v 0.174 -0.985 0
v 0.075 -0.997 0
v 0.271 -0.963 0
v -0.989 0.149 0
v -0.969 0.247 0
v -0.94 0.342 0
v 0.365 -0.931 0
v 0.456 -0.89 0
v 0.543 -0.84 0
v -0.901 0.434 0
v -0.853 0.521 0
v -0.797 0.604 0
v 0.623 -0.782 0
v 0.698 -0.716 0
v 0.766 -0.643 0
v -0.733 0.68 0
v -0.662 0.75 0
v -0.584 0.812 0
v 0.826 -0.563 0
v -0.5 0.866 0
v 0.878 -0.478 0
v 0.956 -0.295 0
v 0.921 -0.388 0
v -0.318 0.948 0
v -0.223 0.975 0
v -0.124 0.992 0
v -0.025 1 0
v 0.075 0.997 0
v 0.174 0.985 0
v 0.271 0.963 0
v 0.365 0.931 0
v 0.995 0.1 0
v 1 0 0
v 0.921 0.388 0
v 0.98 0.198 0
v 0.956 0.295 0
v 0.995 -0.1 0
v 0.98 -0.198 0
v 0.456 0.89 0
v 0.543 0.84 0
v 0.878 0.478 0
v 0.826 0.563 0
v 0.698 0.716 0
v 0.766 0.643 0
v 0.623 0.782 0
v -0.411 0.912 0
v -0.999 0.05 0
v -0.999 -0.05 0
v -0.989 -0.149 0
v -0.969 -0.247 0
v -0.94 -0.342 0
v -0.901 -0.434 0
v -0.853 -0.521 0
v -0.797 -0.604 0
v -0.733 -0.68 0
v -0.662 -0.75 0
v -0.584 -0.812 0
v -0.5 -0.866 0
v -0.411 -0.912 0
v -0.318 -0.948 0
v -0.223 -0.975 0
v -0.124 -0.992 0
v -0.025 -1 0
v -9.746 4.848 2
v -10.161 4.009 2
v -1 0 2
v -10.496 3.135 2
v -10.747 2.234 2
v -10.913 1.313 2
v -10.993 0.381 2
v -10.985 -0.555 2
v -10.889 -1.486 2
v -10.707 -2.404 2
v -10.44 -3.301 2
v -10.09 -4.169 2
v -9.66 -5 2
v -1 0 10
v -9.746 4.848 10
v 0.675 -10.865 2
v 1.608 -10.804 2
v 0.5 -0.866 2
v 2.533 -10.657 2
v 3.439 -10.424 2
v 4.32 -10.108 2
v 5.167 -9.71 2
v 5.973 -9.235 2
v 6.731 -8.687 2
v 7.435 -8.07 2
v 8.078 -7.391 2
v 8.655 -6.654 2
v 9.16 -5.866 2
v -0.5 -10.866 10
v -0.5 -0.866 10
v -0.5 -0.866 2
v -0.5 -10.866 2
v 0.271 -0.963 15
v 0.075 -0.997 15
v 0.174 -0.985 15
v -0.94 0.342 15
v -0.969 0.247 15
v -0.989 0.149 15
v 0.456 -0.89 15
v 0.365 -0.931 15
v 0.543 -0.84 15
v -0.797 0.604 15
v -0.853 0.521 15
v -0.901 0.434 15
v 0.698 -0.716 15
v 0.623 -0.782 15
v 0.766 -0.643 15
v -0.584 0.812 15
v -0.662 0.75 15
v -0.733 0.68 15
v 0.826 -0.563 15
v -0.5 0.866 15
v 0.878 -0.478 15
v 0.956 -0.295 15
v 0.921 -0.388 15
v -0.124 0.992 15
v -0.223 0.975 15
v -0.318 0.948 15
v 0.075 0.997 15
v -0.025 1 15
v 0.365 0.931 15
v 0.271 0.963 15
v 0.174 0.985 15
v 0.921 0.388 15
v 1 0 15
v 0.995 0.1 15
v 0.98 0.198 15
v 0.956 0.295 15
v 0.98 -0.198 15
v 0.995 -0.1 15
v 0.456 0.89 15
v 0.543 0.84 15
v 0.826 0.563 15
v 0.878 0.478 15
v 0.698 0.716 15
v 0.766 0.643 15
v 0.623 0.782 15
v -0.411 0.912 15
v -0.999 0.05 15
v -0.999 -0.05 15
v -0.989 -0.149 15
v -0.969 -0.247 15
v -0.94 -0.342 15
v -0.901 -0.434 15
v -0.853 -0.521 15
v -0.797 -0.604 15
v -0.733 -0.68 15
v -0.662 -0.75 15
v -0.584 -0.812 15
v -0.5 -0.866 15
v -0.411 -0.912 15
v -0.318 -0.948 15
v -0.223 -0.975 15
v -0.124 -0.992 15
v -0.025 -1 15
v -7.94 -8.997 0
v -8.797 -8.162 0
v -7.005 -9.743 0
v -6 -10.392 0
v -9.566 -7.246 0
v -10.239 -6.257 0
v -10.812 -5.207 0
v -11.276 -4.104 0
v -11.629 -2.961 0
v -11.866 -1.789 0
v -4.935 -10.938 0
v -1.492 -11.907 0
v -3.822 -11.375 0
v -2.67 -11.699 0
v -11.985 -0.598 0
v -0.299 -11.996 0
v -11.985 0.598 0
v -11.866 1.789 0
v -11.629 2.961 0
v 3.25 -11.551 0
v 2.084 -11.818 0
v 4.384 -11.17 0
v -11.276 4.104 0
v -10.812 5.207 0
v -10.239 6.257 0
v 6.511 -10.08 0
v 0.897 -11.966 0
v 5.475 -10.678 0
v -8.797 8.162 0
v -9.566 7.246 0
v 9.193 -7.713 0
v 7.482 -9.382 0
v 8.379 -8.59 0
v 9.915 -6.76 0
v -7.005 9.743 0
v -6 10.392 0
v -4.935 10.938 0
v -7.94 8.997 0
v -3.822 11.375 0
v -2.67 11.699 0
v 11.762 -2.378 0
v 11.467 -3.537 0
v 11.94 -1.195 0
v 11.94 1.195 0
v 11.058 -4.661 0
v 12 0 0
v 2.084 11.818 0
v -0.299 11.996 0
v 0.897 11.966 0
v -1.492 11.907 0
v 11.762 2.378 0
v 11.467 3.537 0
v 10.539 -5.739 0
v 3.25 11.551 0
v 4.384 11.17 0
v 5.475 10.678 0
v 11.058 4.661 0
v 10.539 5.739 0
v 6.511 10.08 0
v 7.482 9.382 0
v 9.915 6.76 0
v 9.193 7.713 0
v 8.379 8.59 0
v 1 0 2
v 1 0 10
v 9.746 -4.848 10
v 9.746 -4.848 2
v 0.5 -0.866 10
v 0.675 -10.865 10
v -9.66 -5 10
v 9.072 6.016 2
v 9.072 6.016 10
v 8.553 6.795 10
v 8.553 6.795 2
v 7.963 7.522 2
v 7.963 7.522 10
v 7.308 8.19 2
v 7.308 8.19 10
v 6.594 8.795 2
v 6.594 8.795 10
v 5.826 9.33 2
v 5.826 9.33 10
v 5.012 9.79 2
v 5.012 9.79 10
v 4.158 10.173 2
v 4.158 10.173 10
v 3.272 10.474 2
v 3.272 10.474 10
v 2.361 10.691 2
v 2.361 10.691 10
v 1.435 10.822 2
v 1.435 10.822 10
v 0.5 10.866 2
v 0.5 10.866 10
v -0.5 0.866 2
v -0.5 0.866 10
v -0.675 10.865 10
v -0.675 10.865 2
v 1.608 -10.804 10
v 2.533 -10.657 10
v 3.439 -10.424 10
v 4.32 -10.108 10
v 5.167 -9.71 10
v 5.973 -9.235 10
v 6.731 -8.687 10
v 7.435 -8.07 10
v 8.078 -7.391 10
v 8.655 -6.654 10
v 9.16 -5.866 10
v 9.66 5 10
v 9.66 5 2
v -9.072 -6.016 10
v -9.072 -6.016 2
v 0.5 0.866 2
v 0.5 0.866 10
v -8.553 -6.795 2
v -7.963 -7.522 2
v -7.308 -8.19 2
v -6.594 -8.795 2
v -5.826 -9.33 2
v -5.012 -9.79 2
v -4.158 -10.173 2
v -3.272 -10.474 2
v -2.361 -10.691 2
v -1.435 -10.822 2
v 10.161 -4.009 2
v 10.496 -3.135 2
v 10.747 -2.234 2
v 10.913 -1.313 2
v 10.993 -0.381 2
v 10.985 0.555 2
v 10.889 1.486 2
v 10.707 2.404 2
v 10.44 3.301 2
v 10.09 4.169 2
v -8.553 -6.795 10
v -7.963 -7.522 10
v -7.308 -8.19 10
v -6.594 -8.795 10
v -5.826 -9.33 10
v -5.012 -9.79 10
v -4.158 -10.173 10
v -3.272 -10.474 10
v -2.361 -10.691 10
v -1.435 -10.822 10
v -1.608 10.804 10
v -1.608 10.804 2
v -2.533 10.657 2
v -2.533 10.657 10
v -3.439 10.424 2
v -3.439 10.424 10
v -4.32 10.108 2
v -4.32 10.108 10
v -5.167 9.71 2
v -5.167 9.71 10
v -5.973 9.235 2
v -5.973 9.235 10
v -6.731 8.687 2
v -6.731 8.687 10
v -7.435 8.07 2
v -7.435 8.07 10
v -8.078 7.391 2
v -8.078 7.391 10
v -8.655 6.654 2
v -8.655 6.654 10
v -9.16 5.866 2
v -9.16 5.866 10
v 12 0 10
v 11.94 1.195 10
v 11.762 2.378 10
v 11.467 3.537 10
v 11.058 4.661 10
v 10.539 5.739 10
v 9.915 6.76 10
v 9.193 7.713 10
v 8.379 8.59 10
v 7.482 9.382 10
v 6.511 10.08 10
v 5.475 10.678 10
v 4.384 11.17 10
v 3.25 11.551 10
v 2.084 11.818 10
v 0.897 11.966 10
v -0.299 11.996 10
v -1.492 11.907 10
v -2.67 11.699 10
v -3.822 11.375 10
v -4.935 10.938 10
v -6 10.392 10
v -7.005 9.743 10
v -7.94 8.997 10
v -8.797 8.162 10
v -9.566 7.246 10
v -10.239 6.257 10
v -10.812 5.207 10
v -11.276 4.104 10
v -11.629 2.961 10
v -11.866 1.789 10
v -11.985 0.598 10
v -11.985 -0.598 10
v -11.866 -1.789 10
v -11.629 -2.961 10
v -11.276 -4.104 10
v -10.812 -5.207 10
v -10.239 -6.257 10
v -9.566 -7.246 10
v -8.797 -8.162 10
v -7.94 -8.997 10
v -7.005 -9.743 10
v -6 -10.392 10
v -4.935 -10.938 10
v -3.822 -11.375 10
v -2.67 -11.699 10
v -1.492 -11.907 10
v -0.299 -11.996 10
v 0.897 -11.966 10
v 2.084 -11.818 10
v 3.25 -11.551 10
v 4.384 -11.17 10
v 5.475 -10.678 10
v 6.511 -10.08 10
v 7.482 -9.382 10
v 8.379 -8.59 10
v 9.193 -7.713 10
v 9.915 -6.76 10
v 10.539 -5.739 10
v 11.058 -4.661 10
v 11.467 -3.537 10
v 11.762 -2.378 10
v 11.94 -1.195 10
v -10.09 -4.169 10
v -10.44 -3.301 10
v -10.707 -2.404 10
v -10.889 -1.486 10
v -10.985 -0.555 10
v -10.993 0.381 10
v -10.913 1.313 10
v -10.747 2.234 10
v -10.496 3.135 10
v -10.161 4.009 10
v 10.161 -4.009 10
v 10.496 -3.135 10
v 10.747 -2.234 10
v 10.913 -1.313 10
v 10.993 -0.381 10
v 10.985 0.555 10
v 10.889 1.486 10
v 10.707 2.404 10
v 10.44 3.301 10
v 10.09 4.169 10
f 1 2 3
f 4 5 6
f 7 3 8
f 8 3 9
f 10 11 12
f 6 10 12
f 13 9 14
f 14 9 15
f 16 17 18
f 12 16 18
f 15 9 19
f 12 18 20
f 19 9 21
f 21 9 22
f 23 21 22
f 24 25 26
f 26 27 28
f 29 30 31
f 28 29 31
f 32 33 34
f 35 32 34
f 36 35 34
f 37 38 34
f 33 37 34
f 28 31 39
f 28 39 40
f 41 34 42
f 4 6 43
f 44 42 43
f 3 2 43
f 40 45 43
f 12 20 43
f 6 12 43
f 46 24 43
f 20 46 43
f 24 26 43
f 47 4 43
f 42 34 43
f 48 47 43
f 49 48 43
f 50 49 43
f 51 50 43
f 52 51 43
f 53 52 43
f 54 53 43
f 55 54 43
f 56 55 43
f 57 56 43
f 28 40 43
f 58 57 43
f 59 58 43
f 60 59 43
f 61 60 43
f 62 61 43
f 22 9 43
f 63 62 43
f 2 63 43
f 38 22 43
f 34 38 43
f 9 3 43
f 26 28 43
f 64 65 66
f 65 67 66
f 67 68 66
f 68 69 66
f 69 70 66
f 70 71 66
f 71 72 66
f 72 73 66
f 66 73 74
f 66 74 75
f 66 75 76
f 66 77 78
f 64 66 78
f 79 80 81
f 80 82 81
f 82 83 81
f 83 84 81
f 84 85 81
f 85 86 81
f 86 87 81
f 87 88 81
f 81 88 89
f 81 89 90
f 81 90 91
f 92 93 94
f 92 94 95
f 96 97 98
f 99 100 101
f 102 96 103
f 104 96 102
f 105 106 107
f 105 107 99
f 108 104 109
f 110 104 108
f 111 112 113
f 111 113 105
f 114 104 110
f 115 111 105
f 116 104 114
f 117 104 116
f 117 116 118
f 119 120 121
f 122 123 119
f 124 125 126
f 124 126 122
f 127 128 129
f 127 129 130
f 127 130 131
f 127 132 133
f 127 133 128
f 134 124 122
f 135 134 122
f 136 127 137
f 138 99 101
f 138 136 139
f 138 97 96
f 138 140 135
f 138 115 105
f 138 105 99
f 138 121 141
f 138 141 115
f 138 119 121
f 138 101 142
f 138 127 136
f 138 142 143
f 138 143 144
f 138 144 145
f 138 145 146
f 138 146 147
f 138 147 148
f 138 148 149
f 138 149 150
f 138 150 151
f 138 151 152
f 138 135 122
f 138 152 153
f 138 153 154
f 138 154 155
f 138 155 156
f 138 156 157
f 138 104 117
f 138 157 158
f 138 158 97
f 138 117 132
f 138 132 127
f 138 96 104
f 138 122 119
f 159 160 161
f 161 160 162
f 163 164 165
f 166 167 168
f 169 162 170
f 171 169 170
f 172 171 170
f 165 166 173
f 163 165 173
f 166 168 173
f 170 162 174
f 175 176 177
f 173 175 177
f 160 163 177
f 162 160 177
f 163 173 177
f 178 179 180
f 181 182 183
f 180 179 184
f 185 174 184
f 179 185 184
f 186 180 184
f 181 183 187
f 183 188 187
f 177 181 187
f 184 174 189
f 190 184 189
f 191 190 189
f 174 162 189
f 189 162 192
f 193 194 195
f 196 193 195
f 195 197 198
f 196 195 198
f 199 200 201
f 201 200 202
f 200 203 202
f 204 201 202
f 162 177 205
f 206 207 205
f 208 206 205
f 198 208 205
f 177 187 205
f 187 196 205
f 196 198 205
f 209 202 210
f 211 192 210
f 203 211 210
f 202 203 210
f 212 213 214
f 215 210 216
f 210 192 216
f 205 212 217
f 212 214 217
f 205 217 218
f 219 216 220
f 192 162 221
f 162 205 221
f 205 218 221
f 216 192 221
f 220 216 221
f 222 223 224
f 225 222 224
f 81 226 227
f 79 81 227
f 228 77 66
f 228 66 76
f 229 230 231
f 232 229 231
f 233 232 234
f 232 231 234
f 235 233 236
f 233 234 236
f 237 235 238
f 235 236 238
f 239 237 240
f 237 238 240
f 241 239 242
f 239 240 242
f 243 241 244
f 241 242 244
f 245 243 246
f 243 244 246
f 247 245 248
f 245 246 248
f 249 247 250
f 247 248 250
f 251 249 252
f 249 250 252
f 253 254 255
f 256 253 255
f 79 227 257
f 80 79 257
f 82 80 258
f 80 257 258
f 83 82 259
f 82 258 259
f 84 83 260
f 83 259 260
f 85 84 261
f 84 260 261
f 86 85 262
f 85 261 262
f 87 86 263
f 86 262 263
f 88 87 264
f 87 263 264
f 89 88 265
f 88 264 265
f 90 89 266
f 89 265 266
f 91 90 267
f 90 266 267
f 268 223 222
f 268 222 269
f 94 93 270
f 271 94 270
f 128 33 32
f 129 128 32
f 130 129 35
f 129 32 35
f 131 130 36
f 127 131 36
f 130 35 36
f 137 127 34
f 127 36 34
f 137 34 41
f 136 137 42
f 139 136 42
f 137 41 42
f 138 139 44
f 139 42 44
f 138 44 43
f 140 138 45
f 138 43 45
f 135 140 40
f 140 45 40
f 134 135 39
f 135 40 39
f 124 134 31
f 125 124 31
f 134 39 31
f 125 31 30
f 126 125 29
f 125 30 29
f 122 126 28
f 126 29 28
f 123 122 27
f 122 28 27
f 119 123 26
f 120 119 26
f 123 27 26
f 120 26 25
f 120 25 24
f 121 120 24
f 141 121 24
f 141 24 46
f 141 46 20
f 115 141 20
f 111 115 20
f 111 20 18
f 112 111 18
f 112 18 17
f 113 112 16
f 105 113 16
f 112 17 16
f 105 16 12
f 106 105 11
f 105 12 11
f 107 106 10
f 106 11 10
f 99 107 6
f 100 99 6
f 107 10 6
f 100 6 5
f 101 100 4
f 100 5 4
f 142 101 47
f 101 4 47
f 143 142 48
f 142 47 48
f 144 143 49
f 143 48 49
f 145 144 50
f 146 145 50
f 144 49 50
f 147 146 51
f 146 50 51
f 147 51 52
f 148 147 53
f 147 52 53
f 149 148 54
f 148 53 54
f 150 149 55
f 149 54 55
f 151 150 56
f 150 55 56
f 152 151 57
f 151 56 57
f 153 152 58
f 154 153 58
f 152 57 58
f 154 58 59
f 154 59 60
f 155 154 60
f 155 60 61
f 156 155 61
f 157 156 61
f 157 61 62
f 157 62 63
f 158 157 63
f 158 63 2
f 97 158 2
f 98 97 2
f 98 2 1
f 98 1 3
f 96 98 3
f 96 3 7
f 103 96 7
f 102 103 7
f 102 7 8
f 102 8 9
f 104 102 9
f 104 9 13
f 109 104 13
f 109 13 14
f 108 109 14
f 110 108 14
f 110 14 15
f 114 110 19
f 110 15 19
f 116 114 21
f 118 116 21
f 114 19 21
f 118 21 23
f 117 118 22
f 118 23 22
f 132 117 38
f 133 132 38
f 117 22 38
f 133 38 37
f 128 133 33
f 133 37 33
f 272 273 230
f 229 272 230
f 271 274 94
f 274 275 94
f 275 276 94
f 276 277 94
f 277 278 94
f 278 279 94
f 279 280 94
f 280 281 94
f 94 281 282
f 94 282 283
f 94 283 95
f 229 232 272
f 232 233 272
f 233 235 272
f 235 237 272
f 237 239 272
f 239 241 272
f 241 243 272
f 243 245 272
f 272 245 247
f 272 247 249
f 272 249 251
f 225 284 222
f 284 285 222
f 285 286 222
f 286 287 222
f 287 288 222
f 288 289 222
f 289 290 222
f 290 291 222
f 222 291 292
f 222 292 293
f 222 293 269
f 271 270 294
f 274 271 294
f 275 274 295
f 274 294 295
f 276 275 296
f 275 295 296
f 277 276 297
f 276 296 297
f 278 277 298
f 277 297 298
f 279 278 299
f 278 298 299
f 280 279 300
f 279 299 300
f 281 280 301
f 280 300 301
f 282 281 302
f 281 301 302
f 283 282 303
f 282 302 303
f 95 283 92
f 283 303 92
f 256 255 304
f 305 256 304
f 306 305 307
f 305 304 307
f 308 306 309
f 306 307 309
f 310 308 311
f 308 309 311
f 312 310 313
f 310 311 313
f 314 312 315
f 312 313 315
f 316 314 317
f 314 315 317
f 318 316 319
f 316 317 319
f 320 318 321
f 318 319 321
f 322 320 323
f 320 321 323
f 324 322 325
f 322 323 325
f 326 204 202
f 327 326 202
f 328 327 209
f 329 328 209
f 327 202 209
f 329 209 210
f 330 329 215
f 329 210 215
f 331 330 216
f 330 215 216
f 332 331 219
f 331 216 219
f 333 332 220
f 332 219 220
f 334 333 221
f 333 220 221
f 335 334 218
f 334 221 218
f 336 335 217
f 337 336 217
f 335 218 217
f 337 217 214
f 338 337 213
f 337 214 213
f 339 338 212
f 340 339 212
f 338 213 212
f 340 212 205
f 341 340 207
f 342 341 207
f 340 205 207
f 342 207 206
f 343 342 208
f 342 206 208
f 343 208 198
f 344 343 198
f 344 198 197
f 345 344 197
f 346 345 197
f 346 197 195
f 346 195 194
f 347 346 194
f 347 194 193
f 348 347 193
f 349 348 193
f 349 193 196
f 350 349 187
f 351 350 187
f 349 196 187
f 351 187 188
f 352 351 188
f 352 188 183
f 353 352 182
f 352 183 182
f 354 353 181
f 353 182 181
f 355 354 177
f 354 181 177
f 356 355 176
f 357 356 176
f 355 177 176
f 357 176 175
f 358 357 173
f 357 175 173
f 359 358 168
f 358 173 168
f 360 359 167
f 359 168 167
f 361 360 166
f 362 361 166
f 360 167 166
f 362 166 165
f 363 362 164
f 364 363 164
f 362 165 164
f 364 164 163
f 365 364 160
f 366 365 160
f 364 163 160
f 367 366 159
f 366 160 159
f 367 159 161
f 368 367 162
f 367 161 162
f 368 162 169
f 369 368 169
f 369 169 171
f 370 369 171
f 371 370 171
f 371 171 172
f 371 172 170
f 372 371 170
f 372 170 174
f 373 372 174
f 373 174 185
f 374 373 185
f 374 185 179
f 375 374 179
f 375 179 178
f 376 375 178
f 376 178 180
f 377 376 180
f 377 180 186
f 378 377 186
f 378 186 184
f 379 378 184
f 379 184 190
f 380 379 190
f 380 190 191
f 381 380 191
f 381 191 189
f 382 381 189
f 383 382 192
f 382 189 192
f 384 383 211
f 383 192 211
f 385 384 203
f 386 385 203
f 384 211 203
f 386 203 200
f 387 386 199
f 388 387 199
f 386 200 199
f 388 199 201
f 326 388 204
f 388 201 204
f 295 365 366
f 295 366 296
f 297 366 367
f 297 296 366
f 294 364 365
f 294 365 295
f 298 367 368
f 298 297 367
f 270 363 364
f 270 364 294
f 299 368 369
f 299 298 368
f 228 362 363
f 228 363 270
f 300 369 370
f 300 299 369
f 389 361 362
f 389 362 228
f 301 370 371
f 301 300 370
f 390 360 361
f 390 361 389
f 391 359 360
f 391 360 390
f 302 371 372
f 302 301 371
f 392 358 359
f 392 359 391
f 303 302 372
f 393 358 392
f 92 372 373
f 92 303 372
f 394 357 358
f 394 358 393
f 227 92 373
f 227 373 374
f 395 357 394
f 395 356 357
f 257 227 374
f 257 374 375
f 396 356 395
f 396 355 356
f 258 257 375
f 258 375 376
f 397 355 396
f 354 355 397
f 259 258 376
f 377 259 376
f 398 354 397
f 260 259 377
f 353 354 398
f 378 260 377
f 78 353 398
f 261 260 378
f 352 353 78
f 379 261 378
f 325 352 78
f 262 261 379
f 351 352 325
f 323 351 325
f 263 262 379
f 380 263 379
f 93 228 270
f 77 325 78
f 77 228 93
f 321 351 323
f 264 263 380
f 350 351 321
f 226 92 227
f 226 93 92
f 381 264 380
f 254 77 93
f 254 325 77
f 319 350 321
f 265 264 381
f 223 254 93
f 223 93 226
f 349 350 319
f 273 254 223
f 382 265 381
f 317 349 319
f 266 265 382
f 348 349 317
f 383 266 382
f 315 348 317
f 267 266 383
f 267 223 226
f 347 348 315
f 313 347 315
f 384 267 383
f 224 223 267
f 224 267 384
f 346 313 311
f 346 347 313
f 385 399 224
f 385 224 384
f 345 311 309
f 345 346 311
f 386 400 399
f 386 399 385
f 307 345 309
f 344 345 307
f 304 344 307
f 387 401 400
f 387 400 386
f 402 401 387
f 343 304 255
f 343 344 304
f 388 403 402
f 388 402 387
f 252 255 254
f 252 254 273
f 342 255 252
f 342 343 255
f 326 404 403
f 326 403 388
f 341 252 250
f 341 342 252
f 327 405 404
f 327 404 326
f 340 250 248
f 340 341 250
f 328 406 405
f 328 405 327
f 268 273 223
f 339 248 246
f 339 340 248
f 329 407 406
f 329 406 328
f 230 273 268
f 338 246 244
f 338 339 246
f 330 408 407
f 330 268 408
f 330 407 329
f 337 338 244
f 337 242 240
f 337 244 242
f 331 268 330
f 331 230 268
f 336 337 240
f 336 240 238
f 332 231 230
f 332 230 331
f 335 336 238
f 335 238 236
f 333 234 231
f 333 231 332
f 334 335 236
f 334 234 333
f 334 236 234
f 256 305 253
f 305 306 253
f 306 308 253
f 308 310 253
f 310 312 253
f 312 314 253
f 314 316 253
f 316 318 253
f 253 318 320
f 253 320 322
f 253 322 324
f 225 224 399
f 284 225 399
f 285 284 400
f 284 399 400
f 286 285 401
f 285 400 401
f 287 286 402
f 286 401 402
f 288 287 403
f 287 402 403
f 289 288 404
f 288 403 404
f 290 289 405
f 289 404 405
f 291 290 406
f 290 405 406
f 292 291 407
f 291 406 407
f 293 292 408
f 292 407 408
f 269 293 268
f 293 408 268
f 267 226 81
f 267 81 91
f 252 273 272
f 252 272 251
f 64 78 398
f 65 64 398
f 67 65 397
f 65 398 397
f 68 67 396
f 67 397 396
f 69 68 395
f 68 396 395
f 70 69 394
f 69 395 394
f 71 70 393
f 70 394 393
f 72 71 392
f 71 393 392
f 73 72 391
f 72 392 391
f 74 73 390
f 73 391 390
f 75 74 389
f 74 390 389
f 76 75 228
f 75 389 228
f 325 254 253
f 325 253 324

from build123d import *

# Parameters (mm, degrees)
CYLINDER002_R               = 1
CYLINDER002_DEPTH           = 15
CYLINDER001_W               = 10
CYLINDER001_H               = 10
CYLINDER001_ANGLE           = 59
CYLINDER001_PLACEMENT_ANGLE = -29
ARRAY_COUNT                 = 6
CYLINDER_R                  = 12
CYLINDER_DEPTH              = 10


with BuildPart() as referencia:
    # Cylinder002 → Cylinder002 (new body)
    with BuildSketch(Plane.XY):
        Circle(CYLINDER002_R)
    extrude(amount=CYLINDER002_DEPTH)


with BuildPart() as array_quesitos:
    # Cylinder001 → Cylinder001 (revolve)
    with BuildSketch(Plane.XZ):
        with Locations((5, 5)):
            Rectangle(CYLINDER001_W, CYLINDER001_H)
    revolve(axis=Axis((0, 0, 0), (0, 0, 1)), revolution_arc=CYLINDER001_ANGLE)


with BuildPart() as array_quesitos_1:
    # Cylinder001 placement: moved
    add(array_quesitos.part.moved(Location((1, 0, 2))).rotate(Axis((1, 0, 2), (0, 0, 1)), CYLINDER001_PLACEMENT_ANGLE))

    # Array: Array_quesitos ×6 about axis
    array_axis = Axis((0, 0, 0), (0, 0, 1))


with BuildPart() as array_quesitos_2:
    add(array_quesitos_1.part)
    for i in range(1, ARRAY_COUNT):
        add(array_quesitos_1.part.rotate(array_axis, i * 360 / ARRAY_COUNT))


with BuildPart() as cut:
    # Cylinder → Cylinder (new body)
    with BuildSketch(Plane.XY):
        Circle(CYLINDER_R)
    extrude(amount=CYLINDER_DEPTH)

    # Cut: cut Array_quesitos
    add(array_quesitos_2.part, mode=Mode.SUBTRACT)


solid = Compound([referencia.part, cut.part])
